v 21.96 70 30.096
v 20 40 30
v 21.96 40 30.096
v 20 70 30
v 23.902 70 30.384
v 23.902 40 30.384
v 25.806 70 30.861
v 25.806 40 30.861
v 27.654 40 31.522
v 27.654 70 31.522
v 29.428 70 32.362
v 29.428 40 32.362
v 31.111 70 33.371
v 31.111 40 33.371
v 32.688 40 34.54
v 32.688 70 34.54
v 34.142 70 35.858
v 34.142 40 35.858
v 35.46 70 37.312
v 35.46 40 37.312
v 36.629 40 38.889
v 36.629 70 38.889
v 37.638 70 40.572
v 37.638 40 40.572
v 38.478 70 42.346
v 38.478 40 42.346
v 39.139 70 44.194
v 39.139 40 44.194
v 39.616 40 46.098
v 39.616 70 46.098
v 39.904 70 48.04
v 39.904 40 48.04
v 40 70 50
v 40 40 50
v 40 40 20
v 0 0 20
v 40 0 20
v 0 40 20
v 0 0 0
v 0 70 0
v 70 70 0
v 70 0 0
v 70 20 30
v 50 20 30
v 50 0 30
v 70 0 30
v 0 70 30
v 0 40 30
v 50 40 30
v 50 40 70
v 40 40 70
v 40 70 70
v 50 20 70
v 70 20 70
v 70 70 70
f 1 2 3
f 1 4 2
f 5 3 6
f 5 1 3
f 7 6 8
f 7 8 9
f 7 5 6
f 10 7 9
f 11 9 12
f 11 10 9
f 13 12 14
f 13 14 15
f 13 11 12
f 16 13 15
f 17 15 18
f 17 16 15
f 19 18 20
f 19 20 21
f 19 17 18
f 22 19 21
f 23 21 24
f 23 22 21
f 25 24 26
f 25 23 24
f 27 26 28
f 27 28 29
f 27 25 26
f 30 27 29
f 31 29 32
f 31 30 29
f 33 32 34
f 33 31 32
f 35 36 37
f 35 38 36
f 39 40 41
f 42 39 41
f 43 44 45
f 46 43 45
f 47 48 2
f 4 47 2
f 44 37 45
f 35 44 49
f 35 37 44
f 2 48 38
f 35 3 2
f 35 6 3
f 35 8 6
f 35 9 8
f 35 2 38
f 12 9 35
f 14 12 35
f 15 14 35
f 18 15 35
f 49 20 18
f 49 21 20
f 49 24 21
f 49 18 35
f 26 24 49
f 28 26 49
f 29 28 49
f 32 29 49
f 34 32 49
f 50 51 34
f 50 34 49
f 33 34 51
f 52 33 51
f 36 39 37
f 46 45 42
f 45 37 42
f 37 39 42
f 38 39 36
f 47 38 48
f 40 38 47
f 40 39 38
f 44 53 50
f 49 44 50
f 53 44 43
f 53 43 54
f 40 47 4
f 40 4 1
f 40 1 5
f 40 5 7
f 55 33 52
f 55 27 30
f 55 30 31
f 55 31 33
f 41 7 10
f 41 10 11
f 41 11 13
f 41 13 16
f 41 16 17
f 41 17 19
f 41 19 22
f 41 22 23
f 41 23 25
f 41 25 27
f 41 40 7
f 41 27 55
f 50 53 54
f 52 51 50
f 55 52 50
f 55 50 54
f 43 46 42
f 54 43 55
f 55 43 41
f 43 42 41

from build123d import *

# Parameters (mm, degrees)
F0_W     = 70
F0_H     = 70
F1_DEPTH = 70
F2_W     = 50
F2_H     = 40
F3_DEPTH = 50
F4_W     = 40
F4_H     = 40
F5_DEPTH = 30.001
F6_R     = 20
F7_W     = 20
F7_H     = 40
F8_DEPTH = 20.001
F9_SIZE  = 10


with BuildPart() as f1:
    # F0 (on Top) → F1 (new body)
    with BuildSketch(Plane.XY):
        with Locations((35, 35)):
            Rectangle(F0_W, F0_H)
    extrude(amount=F1_DEPTH)

    # F2 (on face) → F3 (cut)
    with BuildSketch(Plane.XY.offset(70)):
        with Locations((25, 20)):
            Rectangle(F2_W, F2_H)
    extrude(amount=-F3_DEPTH, mode=Mode.SUBTRACT)

    # F4 (on face) → F5 (cut, through all)
    with BuildSketch(Plane.XZ.offset(-40)):
        with Locations((20, 50)):
            Rectangle(F4_W, F4_H)
    extrude(amount=-F5_DEPTH, mode=Mode.SUBTRACT)

    # F6
    f6_edges = [f1.edges().sort_by_distance(p)[0] for p in [
        (40, 55, 30),
    ]]
    fillet(f6_edges, radius=F6_R)

    # F7 (on face) → F8 (cut, through all)
    with BuildSketch(Plane(origin=(50, 0, 0), x_dir=(0, -1, 0), z_dir=(-1, 0, 0))):
        with Locations((-10, 50)):
            Rectangle(F7_W, F7_H)
    extrude(amount=-F8_DEPTH, mode=Mode.SUBTRACT)

    # F9
    f9_edges = [f1.edges().sort_by_distance(p)[0] for p in [
        (50, 20, 20),
    ]]
    chamfer(f9_edges, length=F9_SIZE)


solid = f1.part
